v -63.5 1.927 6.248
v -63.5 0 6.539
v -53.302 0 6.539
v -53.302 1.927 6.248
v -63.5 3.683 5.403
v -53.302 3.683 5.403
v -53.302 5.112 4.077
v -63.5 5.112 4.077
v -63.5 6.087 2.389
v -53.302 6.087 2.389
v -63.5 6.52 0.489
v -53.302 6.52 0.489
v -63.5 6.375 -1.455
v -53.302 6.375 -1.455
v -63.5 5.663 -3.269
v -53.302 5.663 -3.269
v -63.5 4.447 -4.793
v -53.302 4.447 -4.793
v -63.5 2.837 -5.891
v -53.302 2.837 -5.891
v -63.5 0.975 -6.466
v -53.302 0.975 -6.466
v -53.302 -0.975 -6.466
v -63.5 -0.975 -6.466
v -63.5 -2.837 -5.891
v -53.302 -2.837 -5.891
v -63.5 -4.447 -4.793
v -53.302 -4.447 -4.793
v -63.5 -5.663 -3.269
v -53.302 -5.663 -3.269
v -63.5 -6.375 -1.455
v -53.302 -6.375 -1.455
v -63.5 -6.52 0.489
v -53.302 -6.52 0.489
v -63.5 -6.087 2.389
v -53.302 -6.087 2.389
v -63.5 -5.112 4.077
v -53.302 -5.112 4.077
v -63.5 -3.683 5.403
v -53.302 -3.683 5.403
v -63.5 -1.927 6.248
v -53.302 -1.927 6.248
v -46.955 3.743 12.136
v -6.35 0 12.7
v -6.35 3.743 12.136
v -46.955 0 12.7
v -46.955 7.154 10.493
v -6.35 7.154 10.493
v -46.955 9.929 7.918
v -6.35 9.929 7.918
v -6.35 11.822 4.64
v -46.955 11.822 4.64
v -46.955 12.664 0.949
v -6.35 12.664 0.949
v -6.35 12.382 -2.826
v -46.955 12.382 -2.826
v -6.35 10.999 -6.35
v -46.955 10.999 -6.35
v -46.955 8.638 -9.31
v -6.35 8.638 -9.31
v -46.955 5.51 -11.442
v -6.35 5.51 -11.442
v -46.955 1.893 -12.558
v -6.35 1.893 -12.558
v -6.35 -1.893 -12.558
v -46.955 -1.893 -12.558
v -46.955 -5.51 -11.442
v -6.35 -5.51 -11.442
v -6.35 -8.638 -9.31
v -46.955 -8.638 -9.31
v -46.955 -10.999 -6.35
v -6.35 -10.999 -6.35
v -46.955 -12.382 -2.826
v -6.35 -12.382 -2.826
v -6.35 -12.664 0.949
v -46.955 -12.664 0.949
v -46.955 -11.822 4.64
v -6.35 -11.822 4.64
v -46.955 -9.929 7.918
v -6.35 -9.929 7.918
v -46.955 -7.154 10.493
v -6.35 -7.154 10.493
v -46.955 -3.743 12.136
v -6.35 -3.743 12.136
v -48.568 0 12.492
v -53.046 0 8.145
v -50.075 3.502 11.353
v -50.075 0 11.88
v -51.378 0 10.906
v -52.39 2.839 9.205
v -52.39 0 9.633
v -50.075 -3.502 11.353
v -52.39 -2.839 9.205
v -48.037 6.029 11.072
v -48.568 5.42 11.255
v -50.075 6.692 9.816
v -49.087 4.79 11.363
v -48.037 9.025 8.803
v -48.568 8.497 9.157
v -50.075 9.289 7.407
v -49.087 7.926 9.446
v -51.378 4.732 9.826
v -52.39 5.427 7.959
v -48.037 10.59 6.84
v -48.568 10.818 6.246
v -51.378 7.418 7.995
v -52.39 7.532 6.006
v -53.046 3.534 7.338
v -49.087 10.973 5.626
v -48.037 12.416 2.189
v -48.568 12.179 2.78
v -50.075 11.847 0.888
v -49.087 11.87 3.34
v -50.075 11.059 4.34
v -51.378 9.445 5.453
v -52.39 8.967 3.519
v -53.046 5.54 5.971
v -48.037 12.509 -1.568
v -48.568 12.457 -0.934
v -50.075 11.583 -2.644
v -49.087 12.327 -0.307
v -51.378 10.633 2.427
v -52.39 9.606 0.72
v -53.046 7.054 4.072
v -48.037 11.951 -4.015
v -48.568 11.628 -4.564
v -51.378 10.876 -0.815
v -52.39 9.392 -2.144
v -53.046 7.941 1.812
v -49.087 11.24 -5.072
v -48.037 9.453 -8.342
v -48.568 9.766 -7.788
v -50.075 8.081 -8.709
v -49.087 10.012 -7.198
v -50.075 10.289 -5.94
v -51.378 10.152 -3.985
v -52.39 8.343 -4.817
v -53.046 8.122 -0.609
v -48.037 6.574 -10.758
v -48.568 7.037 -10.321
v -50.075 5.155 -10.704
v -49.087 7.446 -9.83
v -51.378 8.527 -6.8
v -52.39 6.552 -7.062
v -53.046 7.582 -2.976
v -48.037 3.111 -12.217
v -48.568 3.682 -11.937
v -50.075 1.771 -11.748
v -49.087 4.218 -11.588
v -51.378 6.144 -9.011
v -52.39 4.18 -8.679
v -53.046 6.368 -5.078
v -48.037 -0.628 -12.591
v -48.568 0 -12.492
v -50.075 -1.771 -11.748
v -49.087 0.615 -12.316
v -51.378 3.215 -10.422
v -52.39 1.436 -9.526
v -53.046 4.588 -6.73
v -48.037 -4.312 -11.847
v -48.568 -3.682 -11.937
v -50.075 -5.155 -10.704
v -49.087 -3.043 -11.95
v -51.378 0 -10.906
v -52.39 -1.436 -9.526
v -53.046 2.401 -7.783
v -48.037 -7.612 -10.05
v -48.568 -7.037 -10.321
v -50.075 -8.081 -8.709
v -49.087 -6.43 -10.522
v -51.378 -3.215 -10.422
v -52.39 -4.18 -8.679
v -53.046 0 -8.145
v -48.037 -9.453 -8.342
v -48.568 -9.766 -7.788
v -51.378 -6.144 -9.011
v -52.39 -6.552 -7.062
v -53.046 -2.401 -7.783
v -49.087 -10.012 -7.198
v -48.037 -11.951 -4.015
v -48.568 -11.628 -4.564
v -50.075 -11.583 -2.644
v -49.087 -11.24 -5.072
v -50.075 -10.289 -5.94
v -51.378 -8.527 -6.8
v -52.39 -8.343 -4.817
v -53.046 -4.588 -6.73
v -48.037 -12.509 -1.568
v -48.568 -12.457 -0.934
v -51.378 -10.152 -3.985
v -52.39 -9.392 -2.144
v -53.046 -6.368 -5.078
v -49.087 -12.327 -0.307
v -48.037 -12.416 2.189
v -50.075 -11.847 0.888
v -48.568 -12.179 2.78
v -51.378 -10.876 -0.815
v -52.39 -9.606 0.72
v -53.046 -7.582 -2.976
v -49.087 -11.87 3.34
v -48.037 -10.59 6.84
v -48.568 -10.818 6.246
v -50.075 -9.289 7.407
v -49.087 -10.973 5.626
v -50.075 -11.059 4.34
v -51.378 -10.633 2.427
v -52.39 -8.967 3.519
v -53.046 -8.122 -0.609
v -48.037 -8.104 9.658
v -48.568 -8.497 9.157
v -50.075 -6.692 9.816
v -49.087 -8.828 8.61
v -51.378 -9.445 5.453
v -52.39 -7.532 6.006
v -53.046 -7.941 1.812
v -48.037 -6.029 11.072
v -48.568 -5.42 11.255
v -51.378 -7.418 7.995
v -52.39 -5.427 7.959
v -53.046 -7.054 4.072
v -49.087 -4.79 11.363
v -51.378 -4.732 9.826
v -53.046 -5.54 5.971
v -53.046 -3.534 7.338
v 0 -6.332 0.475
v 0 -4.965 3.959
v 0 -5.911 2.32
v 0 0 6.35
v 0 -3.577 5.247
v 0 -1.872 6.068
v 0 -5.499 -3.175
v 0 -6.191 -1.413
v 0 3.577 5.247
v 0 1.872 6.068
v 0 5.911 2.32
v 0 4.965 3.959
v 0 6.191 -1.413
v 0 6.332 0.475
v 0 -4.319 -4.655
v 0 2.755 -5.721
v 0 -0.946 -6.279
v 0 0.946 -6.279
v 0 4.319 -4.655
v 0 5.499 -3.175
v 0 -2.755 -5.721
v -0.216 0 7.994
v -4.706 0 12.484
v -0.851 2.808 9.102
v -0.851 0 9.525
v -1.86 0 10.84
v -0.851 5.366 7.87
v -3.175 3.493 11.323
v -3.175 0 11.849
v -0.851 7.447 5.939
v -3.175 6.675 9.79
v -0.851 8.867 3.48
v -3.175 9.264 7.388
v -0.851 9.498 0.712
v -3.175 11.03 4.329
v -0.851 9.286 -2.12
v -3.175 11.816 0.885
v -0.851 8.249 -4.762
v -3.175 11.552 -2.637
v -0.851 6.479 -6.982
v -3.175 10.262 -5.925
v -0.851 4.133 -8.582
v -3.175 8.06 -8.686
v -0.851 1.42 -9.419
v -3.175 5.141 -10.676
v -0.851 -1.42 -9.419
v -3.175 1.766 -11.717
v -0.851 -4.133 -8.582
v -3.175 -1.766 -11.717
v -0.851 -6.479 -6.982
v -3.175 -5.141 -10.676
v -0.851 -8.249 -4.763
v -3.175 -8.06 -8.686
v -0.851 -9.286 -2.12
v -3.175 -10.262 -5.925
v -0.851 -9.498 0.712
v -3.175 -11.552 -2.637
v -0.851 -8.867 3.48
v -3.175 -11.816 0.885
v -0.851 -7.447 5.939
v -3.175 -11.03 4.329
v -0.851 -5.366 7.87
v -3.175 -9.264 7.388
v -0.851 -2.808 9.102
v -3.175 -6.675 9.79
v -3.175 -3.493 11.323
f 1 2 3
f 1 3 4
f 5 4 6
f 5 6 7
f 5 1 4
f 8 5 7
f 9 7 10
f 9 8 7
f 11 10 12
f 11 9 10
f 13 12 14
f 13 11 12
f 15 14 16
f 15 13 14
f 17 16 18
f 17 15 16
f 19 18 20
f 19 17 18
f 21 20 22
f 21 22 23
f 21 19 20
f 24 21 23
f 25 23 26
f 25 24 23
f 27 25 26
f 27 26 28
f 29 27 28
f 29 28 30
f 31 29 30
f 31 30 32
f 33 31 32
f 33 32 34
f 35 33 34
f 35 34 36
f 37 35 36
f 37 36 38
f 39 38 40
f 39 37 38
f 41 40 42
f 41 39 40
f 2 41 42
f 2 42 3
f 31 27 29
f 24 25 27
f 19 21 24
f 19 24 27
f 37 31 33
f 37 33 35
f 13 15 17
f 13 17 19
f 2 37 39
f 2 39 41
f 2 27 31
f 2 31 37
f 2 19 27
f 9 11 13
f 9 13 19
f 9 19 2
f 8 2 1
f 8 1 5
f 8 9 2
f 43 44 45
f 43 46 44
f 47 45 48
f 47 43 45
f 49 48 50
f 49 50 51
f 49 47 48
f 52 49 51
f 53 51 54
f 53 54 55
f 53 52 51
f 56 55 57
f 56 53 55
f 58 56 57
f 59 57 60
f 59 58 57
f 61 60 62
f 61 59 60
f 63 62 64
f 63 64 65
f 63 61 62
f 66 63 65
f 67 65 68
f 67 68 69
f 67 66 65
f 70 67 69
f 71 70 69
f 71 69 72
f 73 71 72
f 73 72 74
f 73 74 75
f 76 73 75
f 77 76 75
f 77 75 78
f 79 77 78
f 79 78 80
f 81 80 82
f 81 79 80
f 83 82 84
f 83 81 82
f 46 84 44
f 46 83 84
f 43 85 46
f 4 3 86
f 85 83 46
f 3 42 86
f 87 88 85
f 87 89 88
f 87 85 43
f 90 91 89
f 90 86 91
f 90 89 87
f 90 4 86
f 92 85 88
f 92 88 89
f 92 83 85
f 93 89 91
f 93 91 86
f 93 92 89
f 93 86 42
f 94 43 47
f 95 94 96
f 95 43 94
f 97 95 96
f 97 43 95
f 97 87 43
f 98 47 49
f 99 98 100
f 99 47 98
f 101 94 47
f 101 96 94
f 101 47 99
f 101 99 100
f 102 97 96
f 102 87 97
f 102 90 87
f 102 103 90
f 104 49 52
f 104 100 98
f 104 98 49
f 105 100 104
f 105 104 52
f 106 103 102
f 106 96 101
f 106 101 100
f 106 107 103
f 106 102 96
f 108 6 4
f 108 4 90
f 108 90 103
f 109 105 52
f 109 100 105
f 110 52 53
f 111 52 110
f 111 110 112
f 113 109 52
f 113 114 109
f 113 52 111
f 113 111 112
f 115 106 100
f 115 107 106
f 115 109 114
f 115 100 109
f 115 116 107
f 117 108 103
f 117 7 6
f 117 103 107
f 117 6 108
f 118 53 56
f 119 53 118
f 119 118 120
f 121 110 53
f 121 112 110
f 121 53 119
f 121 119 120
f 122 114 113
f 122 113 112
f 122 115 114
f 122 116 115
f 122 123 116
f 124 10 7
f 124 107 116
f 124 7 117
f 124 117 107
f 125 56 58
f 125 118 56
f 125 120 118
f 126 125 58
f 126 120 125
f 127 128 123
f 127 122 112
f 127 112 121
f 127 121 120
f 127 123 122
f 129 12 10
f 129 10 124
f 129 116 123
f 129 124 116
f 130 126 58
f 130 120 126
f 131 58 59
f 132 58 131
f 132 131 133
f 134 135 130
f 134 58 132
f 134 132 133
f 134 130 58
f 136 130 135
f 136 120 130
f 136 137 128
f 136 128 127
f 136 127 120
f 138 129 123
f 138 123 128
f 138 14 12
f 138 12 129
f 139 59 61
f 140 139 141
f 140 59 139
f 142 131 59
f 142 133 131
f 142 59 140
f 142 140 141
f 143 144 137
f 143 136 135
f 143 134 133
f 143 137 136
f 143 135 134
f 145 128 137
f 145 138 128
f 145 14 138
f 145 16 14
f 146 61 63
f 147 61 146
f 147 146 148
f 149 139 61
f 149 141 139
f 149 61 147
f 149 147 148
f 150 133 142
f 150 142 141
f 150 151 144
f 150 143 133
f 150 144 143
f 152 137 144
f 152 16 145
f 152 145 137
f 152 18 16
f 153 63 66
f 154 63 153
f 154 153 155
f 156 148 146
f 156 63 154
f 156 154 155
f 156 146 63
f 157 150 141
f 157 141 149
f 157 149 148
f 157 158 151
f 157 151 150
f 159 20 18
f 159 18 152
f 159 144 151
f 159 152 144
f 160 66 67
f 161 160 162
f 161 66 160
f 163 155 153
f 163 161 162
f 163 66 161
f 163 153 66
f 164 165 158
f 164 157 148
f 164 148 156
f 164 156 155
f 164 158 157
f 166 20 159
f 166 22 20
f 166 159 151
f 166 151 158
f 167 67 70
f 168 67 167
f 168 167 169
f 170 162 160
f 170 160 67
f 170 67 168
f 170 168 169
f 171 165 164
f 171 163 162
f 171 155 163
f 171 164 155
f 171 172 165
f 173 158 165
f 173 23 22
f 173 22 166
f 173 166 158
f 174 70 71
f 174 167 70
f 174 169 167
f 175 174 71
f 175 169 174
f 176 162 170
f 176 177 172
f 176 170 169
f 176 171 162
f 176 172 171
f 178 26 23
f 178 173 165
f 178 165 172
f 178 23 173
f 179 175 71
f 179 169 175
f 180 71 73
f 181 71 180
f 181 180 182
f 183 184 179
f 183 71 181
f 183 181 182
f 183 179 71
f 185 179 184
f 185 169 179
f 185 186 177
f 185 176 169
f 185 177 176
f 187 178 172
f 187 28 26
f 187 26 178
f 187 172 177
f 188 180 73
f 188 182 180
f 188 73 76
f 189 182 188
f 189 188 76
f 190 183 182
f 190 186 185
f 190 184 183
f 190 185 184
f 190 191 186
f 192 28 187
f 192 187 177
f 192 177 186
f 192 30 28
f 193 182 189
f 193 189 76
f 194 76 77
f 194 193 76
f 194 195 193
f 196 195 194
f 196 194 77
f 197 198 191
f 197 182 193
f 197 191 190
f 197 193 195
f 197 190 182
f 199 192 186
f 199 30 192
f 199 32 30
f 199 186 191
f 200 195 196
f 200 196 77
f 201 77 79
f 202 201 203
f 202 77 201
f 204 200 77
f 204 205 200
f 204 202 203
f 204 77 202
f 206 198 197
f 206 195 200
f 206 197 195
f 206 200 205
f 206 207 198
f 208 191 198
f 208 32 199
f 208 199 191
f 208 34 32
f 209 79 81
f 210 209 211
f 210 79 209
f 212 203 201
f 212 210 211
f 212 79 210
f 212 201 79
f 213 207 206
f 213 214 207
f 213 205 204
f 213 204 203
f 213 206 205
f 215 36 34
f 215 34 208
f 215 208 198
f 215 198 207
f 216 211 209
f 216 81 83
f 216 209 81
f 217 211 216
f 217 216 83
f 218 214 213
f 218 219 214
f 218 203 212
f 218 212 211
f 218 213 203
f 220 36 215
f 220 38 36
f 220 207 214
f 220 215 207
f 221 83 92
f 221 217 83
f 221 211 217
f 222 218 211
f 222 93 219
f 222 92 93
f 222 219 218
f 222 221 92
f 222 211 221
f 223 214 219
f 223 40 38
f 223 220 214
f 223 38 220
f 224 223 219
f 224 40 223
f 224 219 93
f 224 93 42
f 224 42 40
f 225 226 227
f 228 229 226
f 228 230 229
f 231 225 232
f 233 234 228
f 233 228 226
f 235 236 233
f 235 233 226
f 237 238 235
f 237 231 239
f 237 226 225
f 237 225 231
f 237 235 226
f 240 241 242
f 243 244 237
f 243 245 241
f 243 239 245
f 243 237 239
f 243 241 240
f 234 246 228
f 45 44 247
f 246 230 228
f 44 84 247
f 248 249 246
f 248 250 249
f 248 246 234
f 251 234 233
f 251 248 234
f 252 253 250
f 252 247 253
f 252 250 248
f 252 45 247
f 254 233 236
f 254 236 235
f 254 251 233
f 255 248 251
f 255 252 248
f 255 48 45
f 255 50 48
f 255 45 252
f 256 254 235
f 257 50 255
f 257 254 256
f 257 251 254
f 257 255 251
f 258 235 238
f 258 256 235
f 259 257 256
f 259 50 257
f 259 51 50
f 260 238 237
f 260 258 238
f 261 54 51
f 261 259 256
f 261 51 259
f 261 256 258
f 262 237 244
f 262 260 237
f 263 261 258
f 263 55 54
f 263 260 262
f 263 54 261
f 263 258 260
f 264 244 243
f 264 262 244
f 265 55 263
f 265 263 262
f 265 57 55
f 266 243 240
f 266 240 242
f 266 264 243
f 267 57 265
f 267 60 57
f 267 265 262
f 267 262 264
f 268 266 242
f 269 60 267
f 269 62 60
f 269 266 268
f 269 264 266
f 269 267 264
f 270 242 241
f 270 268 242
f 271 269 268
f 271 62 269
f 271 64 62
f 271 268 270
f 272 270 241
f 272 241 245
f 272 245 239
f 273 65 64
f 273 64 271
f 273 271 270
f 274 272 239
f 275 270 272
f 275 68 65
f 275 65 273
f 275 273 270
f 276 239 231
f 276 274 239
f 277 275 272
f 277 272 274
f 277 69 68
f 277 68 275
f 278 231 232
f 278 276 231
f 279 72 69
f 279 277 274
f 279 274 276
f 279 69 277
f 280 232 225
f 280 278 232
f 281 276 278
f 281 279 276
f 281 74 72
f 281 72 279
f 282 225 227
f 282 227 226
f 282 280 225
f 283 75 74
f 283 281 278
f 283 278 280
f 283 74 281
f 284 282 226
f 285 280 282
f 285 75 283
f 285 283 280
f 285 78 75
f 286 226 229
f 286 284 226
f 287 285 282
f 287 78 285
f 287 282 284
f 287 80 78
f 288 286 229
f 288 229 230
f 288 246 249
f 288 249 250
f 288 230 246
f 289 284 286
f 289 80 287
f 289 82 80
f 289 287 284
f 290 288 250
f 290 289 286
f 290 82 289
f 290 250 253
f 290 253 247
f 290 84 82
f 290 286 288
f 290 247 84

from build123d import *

# Parameters (mm, degrees)
F2_R = 6.35


# Not quite as in the source:
# - a fillet or chamfer that OpenCascade refuses, or shapes differently, is made with other operations: its cross-section is extruded or revolved along the edge and cut away or added


with BuildPart() as f1:
    # F0 (on Front) → F1 (revolve)
    with BuildSketch(Plane.XZ):
        Polygon((-63.5, 0), (0, 0), (0, 12.7), (-53.3020635424, 12.7), (-53.3020635424, 6.5387478179), (-63.5, 6.5387478179), align=None)
    revolve(axis=Axis((-31.75, 0, 0), (-1, 0, 0)))

    # F2
    f2_edges = [f1.edges().sort_by_distance(p)[0] for p in [
        (0, 0, -12.7),
    ]]
    fillet(f2_edges, radius=F2_R)

    # F3: fillet of radius 6.35 on 1 edges, made by hand

    # F3_s1 → F3_t2 (revolve, cut)
    with BuildSketch(Plane.XZ):
        with BuildLine():
            ThreePointArc((-46.9548693385, 12.7), (-51.3777615685, 10.9063718375), (-53.3020635424, 6.5387478179))
            Line((-53.3020635424, 6.5387478179), (-53.3020635424, 12.7))
            Line((-53.3020635424, 12.7), (-46.9548693385, 12.7))
        make_face()
    revolve(axis=Axis((-53.3020635424, 0, 0), (-1, 0, 0)), mode=Mode.SUBTRACT)


solid = f1.part
